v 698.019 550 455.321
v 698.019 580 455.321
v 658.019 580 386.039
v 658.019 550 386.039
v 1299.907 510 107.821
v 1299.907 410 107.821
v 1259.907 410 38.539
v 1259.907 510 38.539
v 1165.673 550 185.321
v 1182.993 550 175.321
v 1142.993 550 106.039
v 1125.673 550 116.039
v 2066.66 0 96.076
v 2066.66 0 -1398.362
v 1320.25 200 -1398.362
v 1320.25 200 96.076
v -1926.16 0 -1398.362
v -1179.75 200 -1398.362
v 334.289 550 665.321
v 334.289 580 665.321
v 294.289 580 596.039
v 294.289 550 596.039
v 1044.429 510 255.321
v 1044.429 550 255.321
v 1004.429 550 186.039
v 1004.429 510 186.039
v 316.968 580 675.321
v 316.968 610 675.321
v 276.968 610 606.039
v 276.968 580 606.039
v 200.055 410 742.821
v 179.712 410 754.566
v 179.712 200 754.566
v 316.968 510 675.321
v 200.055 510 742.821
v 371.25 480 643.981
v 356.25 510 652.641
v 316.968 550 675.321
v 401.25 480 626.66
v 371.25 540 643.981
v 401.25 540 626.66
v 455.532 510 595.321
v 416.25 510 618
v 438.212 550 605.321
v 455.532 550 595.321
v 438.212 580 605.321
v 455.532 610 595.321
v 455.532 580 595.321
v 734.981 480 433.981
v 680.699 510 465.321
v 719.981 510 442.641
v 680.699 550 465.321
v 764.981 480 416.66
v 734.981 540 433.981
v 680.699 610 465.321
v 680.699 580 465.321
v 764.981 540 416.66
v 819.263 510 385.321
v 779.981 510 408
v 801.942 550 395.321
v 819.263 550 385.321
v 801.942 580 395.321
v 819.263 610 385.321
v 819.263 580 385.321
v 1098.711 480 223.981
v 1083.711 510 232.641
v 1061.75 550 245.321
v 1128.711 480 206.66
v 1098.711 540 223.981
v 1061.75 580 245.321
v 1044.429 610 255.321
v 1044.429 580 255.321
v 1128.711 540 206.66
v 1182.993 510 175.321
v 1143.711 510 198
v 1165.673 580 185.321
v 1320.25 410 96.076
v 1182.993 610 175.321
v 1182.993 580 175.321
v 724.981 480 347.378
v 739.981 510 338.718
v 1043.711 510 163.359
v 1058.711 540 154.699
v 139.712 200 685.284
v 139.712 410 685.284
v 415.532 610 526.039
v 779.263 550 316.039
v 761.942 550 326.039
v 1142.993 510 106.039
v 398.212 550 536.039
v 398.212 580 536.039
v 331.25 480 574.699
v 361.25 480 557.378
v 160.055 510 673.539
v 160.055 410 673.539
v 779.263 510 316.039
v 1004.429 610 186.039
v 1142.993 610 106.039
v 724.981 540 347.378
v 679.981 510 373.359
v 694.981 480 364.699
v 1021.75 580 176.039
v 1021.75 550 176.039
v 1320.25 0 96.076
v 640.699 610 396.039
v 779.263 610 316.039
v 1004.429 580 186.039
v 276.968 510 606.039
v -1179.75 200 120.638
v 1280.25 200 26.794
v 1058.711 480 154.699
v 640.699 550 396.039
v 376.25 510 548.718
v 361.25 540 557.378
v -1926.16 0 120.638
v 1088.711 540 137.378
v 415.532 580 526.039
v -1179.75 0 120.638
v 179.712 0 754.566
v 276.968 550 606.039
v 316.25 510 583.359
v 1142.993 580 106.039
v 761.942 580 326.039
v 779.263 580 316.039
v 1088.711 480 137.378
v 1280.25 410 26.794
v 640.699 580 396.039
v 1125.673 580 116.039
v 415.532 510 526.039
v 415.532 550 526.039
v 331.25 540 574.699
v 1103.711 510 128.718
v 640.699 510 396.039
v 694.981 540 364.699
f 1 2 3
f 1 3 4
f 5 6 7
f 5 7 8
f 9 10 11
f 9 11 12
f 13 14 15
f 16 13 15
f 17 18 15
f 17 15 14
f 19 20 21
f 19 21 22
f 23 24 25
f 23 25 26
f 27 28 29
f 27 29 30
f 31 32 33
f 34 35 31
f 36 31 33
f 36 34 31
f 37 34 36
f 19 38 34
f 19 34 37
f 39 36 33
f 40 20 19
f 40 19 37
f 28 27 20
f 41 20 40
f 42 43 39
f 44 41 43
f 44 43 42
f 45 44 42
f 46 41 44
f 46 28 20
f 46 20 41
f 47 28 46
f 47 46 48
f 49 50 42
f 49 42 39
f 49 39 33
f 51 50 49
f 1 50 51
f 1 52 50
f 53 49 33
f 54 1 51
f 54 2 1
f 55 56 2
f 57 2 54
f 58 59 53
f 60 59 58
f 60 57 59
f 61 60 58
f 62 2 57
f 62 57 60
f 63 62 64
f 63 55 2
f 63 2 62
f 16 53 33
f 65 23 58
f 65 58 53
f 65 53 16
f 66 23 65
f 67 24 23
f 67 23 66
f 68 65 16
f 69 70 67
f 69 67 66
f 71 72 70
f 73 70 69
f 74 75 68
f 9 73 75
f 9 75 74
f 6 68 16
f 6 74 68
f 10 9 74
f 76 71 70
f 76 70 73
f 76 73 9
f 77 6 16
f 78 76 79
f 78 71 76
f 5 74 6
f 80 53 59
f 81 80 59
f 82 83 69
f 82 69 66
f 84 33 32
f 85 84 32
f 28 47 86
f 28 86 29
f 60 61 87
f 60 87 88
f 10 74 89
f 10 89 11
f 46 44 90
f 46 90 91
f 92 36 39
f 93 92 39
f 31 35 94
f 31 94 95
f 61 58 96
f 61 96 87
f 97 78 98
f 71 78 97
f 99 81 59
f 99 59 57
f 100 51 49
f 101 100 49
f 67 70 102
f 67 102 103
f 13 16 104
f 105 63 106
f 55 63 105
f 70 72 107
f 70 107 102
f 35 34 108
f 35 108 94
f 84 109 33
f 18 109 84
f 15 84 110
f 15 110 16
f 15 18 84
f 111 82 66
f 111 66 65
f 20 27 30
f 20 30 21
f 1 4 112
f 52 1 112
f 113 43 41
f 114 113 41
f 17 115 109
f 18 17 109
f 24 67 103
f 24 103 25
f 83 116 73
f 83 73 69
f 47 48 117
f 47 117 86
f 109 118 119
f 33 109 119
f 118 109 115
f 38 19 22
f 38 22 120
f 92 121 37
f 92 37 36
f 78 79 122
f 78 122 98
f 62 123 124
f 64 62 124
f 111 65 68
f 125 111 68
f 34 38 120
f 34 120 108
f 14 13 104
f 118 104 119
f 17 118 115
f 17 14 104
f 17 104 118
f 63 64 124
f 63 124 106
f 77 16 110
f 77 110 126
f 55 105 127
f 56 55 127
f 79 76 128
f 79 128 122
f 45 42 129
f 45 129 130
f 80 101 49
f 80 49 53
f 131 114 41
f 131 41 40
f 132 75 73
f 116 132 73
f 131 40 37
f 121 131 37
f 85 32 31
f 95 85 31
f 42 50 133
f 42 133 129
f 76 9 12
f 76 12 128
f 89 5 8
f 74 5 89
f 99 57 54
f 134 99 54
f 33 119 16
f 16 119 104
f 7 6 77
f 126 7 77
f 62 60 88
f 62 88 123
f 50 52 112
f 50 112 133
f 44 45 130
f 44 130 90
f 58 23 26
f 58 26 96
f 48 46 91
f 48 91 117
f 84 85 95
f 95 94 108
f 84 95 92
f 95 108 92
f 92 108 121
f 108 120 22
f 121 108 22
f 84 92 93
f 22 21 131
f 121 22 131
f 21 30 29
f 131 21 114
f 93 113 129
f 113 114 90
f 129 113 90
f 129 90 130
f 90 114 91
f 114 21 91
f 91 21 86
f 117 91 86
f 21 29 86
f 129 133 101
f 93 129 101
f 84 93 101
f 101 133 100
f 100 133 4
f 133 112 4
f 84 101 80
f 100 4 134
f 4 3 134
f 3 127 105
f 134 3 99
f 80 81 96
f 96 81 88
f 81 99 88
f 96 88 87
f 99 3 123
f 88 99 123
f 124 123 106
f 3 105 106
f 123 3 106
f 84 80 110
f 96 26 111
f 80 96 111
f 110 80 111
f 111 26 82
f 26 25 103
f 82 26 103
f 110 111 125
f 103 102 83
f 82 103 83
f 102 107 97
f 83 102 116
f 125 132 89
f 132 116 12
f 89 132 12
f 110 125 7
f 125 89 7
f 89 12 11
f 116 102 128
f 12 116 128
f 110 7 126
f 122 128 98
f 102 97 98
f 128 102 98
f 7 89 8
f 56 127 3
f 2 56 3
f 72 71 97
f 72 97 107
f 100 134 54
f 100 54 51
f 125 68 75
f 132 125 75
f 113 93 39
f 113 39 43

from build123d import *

# Parameters (mm, degrees)
EXTRUDE_1_DEPTH = 200
EXTRUDE_2_DEPTH = 1494.437287
EXTRUDE_3_DEPTH = 1519
SKETCH_5_W      = 1316.980211505
SKETCH_5_H      = 210
EXTRUDE_4_DEPTH = 80
EXTRUDE_6_DEPTH = 80


with BuildPart() as part:
    # 草图1 → 凸台-拉伸1 (new body)
    with BuildSketch(Plane(origin=(0, 0, 0), x_dir=(1, 0, 0), z_dir=(0, 1, 0))):
        Polygon((-1179.750139523, -120.638280303), (179.711541032, -754.565672914), (1320.249860477, -96.075567161), (1320.249860477, 1398.361719697), (-1179.750139523, 1398.361719697), align=None)
    extrude(amount=EXTRUDE_1_DEPTH)

    # 草图2 → 凸台-拉伸2 (add)
    with BuildSketch(Plane(origin=(0, 0, -1398.361719697), x_dir=(-1, 0, 0), z_dir=(0, 0, -1))):
        Polygon((-1320.249860477, 200), (-1320.249860477, 0), (-2066.660021991, 0), align=None)
    extrude(amount=-EXTRUDE_2_DEPTH)

    # 草图3 → 凸台-拉伸3 (add)
    with BuildSketch(Plane(origin=(0, 0, -1398.361719697), x_dir=(-1, 0, 0), z_dir=(0, 0, -1))):
        Polygon((1179.750139523, 200), (1179.750139523, 0), (1926.160301037, 0), align=None)
    extrude(amount=-EXTRUDE_3_DEPTH)

    # 草图5 → 凸台-拉伸4 (add)
    with BuildSketch(Plane(origin=(371.664406042, 0, 643.741634629), x_dir=(0.866025404, 0, -0.5), z_dir=(0.5, 0, 0.866025404))):
        with Locations((436.842029183, 305)):
            Rectangle(SKETCH_5_W, SKETCH_5_H)
    extrude(amount=-EXTRUDE_4_DEPTH)

    # 草图6 → 凸台-拉伸6 (add)
    with BuildSketch(Plane(origin=(371.664406042, 0, 643.741634629), x_dir=(0.866025404, 0, -0.5), z_dir=(0.5, 0, 0.866025404))):
        Polygon((-198.157970817, 410), (1071.842029183, 410), (1071.842029183, 510), (936.842029183, 510), (936.842029183, 550), (916.842029183, 550), (916.842029183, 580), (936.842029183, 580), (936.842029183, 610), (776.842029183, 610), (776.842029183, 580), (796.842029183, 580), (796.842029183, 550), (776.842029183, 550), (776.842029183, 510), (516.842029183, 510), (516.842029183, 550), (496.842029183, 550), (496.842029183, 580), (516.842029183, 580), (516.842029183, 610), (356.842029183, 610), (356.842029183, 580), (376.842029183, 580), (376.842029183, 550), (356.842029183, 550), (356.842029183, 510), (96.842029183, 510), (96.842029183, 550), (76.842029183, 550), (76.842029183, 580), (96.842029183, 580), (96.842029183, 610), (-63.157970817, 610), (-63.157970817, 580), (-43.157970817, 580), (-43.157970817, 550), (-63.157970817, 550), (-63.157970817, 510), (-198.157970817, 510), align=None)
        Polygon((471.483045334, 510), (454.162537258, 540), (419.521521107, 540), (402.201013031, 510), (419.521521107, 480), (454.162537258, 480), align=None, mode=Mode.SUBTRACT)
        Polygon((51.483045334, 510), (34.162537258, 540), (-0.478478893, 540), (-17.798986969, 510), (-0.478478893, 480), (34.162537258, 480), align=None, mode=Mode.SUBTRACT)
        Polygon((891.483045334, 510), (874.162537258, 540), (839.521521107, 540), (822.201013031, 510), (839.521521107, 480), (874.162537258, 480), align=None, mode=Mode.SUBTRACT)
    extrude(amount=-EXTRUDE_6_DEPTH)


solid = part.part
